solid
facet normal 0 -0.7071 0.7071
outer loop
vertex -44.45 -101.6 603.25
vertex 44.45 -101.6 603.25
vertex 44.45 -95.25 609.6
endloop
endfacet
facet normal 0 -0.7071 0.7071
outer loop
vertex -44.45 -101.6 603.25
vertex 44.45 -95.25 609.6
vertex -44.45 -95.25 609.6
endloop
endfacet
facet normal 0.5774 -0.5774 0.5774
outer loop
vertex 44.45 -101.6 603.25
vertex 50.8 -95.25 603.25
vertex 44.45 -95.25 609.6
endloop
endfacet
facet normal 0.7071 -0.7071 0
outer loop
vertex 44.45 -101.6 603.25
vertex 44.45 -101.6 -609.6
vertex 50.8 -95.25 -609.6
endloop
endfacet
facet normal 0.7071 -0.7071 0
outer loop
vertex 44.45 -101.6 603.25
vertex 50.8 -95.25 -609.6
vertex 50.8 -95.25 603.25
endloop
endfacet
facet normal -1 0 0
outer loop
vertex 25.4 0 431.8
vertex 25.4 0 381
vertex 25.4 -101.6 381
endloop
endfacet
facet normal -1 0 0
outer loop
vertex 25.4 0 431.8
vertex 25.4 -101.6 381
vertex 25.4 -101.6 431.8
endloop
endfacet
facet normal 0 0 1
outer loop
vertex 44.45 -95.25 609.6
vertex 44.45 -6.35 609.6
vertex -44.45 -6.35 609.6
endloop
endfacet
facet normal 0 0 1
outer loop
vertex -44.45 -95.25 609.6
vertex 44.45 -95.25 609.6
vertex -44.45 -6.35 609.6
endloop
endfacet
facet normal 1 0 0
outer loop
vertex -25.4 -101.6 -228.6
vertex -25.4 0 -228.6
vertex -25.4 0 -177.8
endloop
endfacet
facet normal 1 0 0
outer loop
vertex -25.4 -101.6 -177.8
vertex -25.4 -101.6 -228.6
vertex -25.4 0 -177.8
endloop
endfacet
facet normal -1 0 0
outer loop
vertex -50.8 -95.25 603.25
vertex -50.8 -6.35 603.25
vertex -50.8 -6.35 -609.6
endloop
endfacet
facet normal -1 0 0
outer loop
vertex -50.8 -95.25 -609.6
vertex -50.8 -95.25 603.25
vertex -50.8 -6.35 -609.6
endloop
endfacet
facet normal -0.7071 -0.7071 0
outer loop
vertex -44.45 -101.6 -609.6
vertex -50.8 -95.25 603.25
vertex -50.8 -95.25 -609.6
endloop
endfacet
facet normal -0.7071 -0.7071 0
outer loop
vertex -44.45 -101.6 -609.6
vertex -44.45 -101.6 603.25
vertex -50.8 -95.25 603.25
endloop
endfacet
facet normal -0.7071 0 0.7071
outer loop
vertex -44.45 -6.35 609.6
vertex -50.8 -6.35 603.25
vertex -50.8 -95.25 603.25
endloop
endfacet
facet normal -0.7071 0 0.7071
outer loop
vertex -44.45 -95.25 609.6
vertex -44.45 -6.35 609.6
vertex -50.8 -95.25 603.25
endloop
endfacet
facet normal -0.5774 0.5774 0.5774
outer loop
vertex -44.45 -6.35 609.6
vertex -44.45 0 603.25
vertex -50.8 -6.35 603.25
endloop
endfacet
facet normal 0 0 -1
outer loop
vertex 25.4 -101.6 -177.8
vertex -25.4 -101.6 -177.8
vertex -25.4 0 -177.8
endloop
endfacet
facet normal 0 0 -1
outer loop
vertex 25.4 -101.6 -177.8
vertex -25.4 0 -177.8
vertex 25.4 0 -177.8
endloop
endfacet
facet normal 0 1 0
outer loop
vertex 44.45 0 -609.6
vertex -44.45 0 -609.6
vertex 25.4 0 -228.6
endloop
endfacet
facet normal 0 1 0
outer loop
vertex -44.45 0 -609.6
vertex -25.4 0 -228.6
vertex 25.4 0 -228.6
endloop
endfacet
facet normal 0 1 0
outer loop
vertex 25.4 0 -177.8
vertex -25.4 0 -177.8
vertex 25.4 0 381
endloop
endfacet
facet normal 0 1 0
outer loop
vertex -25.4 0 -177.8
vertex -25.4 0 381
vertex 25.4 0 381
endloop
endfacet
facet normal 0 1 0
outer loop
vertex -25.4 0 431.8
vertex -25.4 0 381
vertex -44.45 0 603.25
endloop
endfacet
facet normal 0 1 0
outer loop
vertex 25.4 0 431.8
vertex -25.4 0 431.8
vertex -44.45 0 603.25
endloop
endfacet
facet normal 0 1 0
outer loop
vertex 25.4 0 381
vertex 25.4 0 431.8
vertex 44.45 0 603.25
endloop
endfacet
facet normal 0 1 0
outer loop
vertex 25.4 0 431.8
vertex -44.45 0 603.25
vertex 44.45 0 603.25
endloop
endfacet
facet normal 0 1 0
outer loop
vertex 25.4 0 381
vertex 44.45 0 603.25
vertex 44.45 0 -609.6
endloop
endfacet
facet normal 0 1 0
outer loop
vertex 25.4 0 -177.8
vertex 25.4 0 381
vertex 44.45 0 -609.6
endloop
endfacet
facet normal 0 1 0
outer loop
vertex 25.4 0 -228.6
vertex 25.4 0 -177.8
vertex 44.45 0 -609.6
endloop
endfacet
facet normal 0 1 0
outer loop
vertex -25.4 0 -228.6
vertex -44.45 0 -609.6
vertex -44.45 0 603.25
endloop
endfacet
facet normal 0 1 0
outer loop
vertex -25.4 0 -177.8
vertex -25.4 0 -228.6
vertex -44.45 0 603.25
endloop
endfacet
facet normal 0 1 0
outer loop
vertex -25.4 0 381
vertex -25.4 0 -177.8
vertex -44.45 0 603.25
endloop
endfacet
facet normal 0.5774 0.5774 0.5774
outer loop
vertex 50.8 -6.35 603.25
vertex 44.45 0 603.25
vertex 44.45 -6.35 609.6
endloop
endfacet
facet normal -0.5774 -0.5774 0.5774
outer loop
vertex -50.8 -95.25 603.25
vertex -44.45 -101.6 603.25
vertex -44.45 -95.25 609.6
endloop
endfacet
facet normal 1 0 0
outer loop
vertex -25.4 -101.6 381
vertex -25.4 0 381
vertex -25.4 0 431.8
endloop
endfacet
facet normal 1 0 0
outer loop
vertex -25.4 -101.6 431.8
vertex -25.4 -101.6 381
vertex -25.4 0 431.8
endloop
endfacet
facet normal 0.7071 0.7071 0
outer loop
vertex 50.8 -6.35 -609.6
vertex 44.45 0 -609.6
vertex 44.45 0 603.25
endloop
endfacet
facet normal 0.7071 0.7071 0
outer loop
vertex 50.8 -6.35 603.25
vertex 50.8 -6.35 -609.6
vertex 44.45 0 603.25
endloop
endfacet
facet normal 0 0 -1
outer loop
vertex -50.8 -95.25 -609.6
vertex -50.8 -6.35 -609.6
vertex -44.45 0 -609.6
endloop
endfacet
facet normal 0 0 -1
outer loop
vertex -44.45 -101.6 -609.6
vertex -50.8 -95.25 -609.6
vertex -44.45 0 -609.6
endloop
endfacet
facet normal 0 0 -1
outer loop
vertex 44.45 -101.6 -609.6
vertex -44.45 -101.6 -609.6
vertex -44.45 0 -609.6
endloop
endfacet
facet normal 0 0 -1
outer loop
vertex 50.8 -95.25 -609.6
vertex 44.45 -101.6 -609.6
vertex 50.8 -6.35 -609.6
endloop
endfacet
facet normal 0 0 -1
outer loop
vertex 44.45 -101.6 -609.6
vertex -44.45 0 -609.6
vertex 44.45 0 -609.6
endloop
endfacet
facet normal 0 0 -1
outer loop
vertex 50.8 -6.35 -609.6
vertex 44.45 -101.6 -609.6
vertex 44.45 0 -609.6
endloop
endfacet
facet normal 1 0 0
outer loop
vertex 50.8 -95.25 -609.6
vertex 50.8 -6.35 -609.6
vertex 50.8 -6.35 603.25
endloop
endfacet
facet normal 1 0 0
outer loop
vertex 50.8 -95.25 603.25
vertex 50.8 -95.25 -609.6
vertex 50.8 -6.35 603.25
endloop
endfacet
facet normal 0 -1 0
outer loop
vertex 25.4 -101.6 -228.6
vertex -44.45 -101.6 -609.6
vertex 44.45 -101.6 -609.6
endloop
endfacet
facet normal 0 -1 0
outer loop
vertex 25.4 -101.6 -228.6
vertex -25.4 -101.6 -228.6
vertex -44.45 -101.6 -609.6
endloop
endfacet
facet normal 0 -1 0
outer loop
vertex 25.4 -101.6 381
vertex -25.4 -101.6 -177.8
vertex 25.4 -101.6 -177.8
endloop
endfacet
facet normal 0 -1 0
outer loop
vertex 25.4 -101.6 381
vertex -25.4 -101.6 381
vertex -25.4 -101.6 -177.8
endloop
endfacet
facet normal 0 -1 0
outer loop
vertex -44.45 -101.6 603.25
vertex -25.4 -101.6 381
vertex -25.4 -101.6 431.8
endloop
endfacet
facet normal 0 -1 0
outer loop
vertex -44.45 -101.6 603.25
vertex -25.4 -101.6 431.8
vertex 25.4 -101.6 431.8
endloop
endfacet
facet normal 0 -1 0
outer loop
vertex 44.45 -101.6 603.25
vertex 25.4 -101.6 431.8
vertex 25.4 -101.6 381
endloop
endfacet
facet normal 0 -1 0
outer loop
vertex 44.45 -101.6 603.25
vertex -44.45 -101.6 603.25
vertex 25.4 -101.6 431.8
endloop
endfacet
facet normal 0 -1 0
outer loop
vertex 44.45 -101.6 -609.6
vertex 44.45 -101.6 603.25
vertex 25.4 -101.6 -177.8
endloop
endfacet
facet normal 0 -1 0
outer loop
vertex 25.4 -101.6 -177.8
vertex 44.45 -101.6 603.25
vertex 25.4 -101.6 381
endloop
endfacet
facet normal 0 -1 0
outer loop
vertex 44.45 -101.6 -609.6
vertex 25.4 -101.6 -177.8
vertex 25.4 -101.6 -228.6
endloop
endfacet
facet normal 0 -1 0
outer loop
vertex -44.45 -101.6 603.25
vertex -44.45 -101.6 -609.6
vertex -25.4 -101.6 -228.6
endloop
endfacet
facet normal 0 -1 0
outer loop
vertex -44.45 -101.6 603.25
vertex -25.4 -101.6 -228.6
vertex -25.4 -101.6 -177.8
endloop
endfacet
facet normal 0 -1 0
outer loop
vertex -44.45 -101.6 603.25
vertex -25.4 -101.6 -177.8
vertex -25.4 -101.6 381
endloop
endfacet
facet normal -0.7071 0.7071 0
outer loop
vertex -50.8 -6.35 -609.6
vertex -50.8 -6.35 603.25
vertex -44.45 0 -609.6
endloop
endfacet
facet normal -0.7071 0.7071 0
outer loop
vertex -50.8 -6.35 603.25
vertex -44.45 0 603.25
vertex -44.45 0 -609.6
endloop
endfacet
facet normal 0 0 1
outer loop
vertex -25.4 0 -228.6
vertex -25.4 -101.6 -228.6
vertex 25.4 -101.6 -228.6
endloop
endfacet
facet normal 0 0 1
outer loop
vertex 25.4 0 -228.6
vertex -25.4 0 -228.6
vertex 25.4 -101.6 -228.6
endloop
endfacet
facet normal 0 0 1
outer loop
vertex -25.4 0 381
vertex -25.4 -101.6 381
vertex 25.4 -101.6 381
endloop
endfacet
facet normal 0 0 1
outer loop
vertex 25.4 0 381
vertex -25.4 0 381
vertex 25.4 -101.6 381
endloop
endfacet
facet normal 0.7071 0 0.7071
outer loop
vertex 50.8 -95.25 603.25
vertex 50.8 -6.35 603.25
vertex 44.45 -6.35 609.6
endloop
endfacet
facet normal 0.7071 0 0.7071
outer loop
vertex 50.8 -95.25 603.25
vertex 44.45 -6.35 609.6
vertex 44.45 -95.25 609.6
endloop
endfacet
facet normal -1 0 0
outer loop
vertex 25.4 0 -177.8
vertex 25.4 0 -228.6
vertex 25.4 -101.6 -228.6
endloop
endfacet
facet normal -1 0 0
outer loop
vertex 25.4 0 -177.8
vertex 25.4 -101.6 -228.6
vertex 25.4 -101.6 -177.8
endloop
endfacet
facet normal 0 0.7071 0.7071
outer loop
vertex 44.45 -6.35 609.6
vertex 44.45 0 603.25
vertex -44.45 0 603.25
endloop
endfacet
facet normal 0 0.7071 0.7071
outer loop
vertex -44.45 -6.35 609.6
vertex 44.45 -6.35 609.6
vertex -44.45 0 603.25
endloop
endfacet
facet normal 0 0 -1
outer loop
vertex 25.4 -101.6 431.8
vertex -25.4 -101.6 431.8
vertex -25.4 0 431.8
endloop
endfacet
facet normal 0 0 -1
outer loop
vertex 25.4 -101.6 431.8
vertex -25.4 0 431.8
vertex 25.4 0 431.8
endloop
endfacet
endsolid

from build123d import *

# Parameters (mm, degrees)
F0_W     = 50.8
F0_H     = 50.8
F1_DEPTH = 101.6
F2_SIZE  = 6.35


with BuildPart() as f1:
    # F0 (on Front) → F1 (new body)
    with BuildSketch(Plane.XZ):
        Polygon((50.8, -203.2), (50.8, 609.6), (-50.8, 609.6), (-50.8, 406.4), (-50.8, -203.2), (-50.8, -609.6), (50.8, -609.6), align=None)
        with Locations((0, -203.2)):
            Rectangle(F0_W, F0_H, mode=Mode.SUBTRACT)
        with Locations((0, 406.4)):
            Rectangle(F0_W, F0_H, mode=Mode.SUBTRACT)
    extrude(amount=F1_DEPTH)

    # F2
    f2_edges = [f1.edges().sort_by_distance(p)[0] for p in [
        (-50.8, -101.6, 0),
        (50.8, -101.6, 0),
        (50.8, 0, 0),
        (-50.8, 0, 0),
        (0, 0, 609.6),
        (50.8, -50.8, 609.6),
        (0, -101.6, 609.6),
        (-50.8, -50.8, 609.6),
    ]]
    chamfer(f2_edges, length=F2_SIZE)


solid = f1.part
